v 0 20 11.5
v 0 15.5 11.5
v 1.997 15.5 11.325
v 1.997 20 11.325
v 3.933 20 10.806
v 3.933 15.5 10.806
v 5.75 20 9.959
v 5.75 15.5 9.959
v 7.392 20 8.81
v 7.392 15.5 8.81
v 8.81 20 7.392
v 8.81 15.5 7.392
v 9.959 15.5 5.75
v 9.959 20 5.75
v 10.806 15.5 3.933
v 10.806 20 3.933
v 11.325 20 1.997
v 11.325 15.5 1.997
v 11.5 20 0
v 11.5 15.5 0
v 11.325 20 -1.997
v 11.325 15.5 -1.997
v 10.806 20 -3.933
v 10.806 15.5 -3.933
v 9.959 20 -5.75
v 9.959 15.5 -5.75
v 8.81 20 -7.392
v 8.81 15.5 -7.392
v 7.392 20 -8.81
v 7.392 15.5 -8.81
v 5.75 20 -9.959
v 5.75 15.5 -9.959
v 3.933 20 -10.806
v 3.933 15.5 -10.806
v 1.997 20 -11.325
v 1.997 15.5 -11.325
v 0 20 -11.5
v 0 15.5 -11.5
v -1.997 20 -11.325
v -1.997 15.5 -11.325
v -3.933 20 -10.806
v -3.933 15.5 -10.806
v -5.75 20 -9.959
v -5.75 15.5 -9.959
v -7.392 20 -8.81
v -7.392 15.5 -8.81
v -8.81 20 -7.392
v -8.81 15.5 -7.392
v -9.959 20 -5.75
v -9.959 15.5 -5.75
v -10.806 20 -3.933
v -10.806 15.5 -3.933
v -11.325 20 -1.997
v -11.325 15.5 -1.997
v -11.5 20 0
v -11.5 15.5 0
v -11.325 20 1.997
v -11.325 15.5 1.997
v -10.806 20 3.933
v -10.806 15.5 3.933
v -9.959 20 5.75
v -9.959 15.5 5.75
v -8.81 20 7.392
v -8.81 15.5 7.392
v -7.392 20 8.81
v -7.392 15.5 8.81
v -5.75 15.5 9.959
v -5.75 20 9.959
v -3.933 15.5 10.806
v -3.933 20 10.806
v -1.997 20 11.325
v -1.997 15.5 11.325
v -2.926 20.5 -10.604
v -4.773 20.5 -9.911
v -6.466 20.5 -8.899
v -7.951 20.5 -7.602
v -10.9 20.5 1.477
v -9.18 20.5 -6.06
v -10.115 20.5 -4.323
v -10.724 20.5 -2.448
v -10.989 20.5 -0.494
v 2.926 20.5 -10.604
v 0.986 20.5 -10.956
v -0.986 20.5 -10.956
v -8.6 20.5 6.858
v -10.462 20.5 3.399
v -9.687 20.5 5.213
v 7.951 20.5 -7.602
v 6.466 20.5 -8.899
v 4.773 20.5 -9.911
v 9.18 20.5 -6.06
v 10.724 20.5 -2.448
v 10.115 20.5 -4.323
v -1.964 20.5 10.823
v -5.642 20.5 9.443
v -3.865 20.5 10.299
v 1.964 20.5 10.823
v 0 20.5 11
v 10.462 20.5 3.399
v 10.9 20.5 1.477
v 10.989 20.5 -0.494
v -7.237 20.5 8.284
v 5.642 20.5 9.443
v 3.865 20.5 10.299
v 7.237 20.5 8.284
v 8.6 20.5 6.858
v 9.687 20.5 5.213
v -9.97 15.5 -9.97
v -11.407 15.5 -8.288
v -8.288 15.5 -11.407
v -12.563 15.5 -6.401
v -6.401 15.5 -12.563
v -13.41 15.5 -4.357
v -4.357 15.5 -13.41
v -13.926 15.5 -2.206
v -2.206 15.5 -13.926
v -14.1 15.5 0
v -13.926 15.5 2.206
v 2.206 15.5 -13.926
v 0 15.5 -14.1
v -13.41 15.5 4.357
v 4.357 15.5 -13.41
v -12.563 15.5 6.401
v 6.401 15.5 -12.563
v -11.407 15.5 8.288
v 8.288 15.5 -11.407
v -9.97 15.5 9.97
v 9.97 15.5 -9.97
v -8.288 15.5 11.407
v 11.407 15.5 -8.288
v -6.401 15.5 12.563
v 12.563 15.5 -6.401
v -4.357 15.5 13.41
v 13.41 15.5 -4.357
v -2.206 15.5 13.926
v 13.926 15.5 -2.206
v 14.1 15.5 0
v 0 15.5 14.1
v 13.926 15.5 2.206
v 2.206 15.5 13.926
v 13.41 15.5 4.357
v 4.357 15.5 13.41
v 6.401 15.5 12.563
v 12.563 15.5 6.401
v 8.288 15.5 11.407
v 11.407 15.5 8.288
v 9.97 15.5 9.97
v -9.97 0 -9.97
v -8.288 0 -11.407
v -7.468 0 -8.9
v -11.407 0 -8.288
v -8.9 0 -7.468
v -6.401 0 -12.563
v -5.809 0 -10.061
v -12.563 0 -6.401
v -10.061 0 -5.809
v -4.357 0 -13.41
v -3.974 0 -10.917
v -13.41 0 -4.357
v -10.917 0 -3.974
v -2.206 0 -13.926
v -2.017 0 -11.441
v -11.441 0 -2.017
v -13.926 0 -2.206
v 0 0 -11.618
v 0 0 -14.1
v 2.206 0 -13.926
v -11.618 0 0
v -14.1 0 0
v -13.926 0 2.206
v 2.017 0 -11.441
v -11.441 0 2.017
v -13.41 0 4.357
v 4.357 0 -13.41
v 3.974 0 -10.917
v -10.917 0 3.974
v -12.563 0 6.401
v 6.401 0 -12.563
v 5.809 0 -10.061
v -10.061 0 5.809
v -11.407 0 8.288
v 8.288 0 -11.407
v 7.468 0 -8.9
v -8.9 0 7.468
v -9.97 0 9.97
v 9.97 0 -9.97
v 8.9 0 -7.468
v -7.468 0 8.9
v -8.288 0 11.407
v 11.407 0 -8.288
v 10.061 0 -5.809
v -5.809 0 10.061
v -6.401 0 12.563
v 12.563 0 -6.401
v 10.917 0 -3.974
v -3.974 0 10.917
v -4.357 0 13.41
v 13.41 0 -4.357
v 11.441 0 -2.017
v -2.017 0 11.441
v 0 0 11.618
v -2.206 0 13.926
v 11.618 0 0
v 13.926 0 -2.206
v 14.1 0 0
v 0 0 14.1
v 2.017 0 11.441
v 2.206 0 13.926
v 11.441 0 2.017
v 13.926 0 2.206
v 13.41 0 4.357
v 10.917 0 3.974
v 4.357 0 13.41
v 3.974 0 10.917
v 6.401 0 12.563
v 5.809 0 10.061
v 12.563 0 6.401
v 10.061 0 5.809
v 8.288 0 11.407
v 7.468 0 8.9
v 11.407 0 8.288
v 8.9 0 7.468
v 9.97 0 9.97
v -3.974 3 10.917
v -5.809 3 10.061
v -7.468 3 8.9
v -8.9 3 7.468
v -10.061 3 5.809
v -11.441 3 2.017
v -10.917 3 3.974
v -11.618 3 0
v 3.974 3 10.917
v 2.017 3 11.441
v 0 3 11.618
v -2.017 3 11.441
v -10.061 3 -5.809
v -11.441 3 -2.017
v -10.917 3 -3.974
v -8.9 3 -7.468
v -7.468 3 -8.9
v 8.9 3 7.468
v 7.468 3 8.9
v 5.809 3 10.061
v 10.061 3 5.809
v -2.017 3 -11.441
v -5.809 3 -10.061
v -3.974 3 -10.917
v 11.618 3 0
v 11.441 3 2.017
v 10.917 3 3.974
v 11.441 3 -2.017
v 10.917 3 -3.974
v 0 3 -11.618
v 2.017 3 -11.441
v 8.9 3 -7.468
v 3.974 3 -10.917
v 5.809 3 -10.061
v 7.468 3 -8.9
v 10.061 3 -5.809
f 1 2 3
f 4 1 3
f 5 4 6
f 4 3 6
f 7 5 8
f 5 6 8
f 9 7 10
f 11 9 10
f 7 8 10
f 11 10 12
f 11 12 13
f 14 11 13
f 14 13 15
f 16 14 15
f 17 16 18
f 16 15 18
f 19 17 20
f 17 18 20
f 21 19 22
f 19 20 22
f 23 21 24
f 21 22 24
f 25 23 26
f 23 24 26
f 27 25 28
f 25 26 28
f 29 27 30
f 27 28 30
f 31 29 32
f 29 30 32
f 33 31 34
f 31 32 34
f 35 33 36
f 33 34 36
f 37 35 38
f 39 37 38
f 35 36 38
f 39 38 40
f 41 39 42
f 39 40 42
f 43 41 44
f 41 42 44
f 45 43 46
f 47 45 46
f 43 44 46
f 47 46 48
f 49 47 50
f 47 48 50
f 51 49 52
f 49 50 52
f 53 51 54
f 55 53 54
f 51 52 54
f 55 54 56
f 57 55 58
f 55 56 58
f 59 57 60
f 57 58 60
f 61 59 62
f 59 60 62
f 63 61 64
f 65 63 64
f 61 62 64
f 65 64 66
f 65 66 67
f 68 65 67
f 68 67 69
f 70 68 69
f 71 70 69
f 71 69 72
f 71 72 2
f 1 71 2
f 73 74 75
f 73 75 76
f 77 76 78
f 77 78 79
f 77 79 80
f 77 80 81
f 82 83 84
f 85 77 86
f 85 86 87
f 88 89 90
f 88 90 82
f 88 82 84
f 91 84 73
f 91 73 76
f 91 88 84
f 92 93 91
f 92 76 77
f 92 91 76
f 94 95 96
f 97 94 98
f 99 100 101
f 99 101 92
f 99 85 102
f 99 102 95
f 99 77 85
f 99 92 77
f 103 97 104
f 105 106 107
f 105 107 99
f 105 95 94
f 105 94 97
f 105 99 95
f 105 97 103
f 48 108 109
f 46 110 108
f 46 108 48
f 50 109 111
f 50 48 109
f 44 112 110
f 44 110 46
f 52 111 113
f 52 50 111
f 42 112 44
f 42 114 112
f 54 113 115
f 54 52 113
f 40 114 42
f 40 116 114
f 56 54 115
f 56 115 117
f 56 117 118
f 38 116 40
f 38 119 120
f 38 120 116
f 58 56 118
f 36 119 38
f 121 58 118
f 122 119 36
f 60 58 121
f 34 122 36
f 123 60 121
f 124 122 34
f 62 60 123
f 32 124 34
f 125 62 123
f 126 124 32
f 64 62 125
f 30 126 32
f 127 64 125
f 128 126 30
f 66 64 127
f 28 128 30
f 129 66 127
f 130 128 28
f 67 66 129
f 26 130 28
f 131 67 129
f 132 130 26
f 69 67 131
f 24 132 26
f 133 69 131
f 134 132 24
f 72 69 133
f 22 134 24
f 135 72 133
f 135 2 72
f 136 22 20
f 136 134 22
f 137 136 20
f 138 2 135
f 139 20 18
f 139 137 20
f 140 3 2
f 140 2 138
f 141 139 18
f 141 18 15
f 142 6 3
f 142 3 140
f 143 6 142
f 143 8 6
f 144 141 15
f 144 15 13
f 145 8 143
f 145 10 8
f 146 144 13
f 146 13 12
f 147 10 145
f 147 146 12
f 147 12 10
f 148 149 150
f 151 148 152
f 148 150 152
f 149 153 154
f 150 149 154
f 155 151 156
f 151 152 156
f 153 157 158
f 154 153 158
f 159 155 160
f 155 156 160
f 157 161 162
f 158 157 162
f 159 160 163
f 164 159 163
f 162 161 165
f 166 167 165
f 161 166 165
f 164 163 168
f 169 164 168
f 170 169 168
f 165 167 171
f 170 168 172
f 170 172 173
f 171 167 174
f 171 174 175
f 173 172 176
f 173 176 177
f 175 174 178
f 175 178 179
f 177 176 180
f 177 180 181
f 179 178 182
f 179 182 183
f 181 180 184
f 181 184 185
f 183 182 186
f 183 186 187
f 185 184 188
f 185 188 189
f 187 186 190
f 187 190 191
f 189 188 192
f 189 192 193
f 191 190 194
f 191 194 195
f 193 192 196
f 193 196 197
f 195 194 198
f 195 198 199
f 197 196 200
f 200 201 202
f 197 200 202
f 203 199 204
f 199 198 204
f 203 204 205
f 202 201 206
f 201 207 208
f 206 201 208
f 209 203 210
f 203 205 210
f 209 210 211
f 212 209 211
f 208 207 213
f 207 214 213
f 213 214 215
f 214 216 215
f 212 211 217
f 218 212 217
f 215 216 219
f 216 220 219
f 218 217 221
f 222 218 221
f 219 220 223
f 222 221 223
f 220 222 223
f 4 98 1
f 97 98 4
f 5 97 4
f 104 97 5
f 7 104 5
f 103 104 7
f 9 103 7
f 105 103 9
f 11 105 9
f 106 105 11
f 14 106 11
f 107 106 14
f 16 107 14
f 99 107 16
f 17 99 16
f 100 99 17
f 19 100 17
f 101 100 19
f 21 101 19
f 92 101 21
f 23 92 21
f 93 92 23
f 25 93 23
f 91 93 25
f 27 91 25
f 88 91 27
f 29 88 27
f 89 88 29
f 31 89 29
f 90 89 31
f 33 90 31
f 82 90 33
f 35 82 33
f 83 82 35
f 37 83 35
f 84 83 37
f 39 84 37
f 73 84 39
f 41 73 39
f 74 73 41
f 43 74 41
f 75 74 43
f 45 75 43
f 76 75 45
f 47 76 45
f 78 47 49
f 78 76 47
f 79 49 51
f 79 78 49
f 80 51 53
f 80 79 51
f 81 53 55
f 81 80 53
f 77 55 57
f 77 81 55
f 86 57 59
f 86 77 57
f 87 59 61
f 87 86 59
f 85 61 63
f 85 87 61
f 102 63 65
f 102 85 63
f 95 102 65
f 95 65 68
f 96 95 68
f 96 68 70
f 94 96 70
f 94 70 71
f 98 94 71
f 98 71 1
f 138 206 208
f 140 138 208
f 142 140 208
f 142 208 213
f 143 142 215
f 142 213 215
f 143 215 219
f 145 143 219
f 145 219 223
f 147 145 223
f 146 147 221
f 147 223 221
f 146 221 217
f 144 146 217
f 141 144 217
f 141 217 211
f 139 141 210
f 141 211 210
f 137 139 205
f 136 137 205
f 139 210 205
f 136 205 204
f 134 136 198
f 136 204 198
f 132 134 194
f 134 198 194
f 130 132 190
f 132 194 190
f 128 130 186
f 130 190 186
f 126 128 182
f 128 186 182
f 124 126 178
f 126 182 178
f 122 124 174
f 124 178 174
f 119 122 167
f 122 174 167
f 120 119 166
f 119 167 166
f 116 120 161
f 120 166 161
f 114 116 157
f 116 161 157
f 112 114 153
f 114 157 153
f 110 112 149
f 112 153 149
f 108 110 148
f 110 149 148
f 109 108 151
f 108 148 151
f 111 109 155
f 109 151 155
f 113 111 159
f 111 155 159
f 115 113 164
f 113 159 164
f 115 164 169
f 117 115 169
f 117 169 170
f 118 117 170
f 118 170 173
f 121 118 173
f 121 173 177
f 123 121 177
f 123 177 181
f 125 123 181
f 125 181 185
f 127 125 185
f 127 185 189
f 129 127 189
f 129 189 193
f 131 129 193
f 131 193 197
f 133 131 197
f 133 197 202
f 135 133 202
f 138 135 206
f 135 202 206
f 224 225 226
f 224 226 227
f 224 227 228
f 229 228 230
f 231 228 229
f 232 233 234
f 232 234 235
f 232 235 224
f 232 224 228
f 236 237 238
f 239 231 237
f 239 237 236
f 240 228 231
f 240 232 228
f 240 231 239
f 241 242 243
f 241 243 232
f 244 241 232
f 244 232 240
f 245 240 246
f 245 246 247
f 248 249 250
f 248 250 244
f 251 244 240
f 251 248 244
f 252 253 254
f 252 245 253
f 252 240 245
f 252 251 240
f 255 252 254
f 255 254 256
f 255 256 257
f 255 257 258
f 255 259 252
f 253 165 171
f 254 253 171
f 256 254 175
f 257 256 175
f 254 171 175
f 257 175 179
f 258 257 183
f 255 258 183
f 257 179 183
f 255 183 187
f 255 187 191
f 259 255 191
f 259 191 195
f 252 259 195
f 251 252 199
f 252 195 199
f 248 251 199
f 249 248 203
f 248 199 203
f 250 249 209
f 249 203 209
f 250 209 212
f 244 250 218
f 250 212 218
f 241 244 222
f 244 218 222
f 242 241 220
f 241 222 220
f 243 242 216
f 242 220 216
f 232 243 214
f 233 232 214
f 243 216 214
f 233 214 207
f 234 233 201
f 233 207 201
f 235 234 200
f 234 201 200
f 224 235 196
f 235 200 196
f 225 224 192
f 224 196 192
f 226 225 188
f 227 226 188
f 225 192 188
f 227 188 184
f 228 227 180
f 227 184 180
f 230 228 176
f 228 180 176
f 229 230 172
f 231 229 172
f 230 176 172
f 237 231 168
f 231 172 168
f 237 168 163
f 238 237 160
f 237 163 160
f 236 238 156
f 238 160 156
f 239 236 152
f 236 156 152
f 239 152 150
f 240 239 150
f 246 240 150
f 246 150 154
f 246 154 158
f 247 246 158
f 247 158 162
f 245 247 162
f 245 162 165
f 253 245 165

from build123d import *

# Parameters (mm, degrees)
SKETCH1_R      = 14.1
EXTRUDE1_DEPTH = 15.5
SKETCH2_R      = 11.5
EXTRUDE2_DEPTH = 5
CHAMFER1_SIZE  = 0.5
SKETCH3_R      = 11.617958336
EXTRUDE3_DEPTH = 3


with BuildPart() as part:
    # Sketch1 → Extrude1 (new body)
    with BuildSketch(Plane(origin=(0, 0, 0), x_dir=(1, 0, 0), z_dir=(0, 1, 0))):
        with Locations(Location((0, 0, 0), (0, 0, 270))):
            Circle(SKETCH1_R)
    extrude(amount=EXTRUDE1_DEPTH)

    # Sketch2 → Extrude2 (add)
    with BuildSketch(Plane(origin=(0, 15.5, 0), x_dir=(1, 0, 0), z_dir=(0, 1, 0))):
        with Locations(Location((0, 0, 0), (0, 0, 270))):
            Circle(SKETCH2_R)
    extrude(amount=EXTRUDE2_DEPTH)

    # Chamfer1
    chamfer1_edges = [part.edges().sort_by_distance(p)[0] for p in [
        (0, 20.5, -11.5),
    ]]
    chamfer(chamfer1_edges, length=CHAMFER1_SIZE)

    # Sketch3 → Extrude3 (cut)
    with BuildSketch(Plane.XZ):
        with Locations(Location((0, 0, 0), (0, 0, 270))):
            Circle(SKETCH3_R)
    extrude(amount=-EXTRUDE3_DEPTH, mode=Mode.SUBTRACT)


solid = part.part
